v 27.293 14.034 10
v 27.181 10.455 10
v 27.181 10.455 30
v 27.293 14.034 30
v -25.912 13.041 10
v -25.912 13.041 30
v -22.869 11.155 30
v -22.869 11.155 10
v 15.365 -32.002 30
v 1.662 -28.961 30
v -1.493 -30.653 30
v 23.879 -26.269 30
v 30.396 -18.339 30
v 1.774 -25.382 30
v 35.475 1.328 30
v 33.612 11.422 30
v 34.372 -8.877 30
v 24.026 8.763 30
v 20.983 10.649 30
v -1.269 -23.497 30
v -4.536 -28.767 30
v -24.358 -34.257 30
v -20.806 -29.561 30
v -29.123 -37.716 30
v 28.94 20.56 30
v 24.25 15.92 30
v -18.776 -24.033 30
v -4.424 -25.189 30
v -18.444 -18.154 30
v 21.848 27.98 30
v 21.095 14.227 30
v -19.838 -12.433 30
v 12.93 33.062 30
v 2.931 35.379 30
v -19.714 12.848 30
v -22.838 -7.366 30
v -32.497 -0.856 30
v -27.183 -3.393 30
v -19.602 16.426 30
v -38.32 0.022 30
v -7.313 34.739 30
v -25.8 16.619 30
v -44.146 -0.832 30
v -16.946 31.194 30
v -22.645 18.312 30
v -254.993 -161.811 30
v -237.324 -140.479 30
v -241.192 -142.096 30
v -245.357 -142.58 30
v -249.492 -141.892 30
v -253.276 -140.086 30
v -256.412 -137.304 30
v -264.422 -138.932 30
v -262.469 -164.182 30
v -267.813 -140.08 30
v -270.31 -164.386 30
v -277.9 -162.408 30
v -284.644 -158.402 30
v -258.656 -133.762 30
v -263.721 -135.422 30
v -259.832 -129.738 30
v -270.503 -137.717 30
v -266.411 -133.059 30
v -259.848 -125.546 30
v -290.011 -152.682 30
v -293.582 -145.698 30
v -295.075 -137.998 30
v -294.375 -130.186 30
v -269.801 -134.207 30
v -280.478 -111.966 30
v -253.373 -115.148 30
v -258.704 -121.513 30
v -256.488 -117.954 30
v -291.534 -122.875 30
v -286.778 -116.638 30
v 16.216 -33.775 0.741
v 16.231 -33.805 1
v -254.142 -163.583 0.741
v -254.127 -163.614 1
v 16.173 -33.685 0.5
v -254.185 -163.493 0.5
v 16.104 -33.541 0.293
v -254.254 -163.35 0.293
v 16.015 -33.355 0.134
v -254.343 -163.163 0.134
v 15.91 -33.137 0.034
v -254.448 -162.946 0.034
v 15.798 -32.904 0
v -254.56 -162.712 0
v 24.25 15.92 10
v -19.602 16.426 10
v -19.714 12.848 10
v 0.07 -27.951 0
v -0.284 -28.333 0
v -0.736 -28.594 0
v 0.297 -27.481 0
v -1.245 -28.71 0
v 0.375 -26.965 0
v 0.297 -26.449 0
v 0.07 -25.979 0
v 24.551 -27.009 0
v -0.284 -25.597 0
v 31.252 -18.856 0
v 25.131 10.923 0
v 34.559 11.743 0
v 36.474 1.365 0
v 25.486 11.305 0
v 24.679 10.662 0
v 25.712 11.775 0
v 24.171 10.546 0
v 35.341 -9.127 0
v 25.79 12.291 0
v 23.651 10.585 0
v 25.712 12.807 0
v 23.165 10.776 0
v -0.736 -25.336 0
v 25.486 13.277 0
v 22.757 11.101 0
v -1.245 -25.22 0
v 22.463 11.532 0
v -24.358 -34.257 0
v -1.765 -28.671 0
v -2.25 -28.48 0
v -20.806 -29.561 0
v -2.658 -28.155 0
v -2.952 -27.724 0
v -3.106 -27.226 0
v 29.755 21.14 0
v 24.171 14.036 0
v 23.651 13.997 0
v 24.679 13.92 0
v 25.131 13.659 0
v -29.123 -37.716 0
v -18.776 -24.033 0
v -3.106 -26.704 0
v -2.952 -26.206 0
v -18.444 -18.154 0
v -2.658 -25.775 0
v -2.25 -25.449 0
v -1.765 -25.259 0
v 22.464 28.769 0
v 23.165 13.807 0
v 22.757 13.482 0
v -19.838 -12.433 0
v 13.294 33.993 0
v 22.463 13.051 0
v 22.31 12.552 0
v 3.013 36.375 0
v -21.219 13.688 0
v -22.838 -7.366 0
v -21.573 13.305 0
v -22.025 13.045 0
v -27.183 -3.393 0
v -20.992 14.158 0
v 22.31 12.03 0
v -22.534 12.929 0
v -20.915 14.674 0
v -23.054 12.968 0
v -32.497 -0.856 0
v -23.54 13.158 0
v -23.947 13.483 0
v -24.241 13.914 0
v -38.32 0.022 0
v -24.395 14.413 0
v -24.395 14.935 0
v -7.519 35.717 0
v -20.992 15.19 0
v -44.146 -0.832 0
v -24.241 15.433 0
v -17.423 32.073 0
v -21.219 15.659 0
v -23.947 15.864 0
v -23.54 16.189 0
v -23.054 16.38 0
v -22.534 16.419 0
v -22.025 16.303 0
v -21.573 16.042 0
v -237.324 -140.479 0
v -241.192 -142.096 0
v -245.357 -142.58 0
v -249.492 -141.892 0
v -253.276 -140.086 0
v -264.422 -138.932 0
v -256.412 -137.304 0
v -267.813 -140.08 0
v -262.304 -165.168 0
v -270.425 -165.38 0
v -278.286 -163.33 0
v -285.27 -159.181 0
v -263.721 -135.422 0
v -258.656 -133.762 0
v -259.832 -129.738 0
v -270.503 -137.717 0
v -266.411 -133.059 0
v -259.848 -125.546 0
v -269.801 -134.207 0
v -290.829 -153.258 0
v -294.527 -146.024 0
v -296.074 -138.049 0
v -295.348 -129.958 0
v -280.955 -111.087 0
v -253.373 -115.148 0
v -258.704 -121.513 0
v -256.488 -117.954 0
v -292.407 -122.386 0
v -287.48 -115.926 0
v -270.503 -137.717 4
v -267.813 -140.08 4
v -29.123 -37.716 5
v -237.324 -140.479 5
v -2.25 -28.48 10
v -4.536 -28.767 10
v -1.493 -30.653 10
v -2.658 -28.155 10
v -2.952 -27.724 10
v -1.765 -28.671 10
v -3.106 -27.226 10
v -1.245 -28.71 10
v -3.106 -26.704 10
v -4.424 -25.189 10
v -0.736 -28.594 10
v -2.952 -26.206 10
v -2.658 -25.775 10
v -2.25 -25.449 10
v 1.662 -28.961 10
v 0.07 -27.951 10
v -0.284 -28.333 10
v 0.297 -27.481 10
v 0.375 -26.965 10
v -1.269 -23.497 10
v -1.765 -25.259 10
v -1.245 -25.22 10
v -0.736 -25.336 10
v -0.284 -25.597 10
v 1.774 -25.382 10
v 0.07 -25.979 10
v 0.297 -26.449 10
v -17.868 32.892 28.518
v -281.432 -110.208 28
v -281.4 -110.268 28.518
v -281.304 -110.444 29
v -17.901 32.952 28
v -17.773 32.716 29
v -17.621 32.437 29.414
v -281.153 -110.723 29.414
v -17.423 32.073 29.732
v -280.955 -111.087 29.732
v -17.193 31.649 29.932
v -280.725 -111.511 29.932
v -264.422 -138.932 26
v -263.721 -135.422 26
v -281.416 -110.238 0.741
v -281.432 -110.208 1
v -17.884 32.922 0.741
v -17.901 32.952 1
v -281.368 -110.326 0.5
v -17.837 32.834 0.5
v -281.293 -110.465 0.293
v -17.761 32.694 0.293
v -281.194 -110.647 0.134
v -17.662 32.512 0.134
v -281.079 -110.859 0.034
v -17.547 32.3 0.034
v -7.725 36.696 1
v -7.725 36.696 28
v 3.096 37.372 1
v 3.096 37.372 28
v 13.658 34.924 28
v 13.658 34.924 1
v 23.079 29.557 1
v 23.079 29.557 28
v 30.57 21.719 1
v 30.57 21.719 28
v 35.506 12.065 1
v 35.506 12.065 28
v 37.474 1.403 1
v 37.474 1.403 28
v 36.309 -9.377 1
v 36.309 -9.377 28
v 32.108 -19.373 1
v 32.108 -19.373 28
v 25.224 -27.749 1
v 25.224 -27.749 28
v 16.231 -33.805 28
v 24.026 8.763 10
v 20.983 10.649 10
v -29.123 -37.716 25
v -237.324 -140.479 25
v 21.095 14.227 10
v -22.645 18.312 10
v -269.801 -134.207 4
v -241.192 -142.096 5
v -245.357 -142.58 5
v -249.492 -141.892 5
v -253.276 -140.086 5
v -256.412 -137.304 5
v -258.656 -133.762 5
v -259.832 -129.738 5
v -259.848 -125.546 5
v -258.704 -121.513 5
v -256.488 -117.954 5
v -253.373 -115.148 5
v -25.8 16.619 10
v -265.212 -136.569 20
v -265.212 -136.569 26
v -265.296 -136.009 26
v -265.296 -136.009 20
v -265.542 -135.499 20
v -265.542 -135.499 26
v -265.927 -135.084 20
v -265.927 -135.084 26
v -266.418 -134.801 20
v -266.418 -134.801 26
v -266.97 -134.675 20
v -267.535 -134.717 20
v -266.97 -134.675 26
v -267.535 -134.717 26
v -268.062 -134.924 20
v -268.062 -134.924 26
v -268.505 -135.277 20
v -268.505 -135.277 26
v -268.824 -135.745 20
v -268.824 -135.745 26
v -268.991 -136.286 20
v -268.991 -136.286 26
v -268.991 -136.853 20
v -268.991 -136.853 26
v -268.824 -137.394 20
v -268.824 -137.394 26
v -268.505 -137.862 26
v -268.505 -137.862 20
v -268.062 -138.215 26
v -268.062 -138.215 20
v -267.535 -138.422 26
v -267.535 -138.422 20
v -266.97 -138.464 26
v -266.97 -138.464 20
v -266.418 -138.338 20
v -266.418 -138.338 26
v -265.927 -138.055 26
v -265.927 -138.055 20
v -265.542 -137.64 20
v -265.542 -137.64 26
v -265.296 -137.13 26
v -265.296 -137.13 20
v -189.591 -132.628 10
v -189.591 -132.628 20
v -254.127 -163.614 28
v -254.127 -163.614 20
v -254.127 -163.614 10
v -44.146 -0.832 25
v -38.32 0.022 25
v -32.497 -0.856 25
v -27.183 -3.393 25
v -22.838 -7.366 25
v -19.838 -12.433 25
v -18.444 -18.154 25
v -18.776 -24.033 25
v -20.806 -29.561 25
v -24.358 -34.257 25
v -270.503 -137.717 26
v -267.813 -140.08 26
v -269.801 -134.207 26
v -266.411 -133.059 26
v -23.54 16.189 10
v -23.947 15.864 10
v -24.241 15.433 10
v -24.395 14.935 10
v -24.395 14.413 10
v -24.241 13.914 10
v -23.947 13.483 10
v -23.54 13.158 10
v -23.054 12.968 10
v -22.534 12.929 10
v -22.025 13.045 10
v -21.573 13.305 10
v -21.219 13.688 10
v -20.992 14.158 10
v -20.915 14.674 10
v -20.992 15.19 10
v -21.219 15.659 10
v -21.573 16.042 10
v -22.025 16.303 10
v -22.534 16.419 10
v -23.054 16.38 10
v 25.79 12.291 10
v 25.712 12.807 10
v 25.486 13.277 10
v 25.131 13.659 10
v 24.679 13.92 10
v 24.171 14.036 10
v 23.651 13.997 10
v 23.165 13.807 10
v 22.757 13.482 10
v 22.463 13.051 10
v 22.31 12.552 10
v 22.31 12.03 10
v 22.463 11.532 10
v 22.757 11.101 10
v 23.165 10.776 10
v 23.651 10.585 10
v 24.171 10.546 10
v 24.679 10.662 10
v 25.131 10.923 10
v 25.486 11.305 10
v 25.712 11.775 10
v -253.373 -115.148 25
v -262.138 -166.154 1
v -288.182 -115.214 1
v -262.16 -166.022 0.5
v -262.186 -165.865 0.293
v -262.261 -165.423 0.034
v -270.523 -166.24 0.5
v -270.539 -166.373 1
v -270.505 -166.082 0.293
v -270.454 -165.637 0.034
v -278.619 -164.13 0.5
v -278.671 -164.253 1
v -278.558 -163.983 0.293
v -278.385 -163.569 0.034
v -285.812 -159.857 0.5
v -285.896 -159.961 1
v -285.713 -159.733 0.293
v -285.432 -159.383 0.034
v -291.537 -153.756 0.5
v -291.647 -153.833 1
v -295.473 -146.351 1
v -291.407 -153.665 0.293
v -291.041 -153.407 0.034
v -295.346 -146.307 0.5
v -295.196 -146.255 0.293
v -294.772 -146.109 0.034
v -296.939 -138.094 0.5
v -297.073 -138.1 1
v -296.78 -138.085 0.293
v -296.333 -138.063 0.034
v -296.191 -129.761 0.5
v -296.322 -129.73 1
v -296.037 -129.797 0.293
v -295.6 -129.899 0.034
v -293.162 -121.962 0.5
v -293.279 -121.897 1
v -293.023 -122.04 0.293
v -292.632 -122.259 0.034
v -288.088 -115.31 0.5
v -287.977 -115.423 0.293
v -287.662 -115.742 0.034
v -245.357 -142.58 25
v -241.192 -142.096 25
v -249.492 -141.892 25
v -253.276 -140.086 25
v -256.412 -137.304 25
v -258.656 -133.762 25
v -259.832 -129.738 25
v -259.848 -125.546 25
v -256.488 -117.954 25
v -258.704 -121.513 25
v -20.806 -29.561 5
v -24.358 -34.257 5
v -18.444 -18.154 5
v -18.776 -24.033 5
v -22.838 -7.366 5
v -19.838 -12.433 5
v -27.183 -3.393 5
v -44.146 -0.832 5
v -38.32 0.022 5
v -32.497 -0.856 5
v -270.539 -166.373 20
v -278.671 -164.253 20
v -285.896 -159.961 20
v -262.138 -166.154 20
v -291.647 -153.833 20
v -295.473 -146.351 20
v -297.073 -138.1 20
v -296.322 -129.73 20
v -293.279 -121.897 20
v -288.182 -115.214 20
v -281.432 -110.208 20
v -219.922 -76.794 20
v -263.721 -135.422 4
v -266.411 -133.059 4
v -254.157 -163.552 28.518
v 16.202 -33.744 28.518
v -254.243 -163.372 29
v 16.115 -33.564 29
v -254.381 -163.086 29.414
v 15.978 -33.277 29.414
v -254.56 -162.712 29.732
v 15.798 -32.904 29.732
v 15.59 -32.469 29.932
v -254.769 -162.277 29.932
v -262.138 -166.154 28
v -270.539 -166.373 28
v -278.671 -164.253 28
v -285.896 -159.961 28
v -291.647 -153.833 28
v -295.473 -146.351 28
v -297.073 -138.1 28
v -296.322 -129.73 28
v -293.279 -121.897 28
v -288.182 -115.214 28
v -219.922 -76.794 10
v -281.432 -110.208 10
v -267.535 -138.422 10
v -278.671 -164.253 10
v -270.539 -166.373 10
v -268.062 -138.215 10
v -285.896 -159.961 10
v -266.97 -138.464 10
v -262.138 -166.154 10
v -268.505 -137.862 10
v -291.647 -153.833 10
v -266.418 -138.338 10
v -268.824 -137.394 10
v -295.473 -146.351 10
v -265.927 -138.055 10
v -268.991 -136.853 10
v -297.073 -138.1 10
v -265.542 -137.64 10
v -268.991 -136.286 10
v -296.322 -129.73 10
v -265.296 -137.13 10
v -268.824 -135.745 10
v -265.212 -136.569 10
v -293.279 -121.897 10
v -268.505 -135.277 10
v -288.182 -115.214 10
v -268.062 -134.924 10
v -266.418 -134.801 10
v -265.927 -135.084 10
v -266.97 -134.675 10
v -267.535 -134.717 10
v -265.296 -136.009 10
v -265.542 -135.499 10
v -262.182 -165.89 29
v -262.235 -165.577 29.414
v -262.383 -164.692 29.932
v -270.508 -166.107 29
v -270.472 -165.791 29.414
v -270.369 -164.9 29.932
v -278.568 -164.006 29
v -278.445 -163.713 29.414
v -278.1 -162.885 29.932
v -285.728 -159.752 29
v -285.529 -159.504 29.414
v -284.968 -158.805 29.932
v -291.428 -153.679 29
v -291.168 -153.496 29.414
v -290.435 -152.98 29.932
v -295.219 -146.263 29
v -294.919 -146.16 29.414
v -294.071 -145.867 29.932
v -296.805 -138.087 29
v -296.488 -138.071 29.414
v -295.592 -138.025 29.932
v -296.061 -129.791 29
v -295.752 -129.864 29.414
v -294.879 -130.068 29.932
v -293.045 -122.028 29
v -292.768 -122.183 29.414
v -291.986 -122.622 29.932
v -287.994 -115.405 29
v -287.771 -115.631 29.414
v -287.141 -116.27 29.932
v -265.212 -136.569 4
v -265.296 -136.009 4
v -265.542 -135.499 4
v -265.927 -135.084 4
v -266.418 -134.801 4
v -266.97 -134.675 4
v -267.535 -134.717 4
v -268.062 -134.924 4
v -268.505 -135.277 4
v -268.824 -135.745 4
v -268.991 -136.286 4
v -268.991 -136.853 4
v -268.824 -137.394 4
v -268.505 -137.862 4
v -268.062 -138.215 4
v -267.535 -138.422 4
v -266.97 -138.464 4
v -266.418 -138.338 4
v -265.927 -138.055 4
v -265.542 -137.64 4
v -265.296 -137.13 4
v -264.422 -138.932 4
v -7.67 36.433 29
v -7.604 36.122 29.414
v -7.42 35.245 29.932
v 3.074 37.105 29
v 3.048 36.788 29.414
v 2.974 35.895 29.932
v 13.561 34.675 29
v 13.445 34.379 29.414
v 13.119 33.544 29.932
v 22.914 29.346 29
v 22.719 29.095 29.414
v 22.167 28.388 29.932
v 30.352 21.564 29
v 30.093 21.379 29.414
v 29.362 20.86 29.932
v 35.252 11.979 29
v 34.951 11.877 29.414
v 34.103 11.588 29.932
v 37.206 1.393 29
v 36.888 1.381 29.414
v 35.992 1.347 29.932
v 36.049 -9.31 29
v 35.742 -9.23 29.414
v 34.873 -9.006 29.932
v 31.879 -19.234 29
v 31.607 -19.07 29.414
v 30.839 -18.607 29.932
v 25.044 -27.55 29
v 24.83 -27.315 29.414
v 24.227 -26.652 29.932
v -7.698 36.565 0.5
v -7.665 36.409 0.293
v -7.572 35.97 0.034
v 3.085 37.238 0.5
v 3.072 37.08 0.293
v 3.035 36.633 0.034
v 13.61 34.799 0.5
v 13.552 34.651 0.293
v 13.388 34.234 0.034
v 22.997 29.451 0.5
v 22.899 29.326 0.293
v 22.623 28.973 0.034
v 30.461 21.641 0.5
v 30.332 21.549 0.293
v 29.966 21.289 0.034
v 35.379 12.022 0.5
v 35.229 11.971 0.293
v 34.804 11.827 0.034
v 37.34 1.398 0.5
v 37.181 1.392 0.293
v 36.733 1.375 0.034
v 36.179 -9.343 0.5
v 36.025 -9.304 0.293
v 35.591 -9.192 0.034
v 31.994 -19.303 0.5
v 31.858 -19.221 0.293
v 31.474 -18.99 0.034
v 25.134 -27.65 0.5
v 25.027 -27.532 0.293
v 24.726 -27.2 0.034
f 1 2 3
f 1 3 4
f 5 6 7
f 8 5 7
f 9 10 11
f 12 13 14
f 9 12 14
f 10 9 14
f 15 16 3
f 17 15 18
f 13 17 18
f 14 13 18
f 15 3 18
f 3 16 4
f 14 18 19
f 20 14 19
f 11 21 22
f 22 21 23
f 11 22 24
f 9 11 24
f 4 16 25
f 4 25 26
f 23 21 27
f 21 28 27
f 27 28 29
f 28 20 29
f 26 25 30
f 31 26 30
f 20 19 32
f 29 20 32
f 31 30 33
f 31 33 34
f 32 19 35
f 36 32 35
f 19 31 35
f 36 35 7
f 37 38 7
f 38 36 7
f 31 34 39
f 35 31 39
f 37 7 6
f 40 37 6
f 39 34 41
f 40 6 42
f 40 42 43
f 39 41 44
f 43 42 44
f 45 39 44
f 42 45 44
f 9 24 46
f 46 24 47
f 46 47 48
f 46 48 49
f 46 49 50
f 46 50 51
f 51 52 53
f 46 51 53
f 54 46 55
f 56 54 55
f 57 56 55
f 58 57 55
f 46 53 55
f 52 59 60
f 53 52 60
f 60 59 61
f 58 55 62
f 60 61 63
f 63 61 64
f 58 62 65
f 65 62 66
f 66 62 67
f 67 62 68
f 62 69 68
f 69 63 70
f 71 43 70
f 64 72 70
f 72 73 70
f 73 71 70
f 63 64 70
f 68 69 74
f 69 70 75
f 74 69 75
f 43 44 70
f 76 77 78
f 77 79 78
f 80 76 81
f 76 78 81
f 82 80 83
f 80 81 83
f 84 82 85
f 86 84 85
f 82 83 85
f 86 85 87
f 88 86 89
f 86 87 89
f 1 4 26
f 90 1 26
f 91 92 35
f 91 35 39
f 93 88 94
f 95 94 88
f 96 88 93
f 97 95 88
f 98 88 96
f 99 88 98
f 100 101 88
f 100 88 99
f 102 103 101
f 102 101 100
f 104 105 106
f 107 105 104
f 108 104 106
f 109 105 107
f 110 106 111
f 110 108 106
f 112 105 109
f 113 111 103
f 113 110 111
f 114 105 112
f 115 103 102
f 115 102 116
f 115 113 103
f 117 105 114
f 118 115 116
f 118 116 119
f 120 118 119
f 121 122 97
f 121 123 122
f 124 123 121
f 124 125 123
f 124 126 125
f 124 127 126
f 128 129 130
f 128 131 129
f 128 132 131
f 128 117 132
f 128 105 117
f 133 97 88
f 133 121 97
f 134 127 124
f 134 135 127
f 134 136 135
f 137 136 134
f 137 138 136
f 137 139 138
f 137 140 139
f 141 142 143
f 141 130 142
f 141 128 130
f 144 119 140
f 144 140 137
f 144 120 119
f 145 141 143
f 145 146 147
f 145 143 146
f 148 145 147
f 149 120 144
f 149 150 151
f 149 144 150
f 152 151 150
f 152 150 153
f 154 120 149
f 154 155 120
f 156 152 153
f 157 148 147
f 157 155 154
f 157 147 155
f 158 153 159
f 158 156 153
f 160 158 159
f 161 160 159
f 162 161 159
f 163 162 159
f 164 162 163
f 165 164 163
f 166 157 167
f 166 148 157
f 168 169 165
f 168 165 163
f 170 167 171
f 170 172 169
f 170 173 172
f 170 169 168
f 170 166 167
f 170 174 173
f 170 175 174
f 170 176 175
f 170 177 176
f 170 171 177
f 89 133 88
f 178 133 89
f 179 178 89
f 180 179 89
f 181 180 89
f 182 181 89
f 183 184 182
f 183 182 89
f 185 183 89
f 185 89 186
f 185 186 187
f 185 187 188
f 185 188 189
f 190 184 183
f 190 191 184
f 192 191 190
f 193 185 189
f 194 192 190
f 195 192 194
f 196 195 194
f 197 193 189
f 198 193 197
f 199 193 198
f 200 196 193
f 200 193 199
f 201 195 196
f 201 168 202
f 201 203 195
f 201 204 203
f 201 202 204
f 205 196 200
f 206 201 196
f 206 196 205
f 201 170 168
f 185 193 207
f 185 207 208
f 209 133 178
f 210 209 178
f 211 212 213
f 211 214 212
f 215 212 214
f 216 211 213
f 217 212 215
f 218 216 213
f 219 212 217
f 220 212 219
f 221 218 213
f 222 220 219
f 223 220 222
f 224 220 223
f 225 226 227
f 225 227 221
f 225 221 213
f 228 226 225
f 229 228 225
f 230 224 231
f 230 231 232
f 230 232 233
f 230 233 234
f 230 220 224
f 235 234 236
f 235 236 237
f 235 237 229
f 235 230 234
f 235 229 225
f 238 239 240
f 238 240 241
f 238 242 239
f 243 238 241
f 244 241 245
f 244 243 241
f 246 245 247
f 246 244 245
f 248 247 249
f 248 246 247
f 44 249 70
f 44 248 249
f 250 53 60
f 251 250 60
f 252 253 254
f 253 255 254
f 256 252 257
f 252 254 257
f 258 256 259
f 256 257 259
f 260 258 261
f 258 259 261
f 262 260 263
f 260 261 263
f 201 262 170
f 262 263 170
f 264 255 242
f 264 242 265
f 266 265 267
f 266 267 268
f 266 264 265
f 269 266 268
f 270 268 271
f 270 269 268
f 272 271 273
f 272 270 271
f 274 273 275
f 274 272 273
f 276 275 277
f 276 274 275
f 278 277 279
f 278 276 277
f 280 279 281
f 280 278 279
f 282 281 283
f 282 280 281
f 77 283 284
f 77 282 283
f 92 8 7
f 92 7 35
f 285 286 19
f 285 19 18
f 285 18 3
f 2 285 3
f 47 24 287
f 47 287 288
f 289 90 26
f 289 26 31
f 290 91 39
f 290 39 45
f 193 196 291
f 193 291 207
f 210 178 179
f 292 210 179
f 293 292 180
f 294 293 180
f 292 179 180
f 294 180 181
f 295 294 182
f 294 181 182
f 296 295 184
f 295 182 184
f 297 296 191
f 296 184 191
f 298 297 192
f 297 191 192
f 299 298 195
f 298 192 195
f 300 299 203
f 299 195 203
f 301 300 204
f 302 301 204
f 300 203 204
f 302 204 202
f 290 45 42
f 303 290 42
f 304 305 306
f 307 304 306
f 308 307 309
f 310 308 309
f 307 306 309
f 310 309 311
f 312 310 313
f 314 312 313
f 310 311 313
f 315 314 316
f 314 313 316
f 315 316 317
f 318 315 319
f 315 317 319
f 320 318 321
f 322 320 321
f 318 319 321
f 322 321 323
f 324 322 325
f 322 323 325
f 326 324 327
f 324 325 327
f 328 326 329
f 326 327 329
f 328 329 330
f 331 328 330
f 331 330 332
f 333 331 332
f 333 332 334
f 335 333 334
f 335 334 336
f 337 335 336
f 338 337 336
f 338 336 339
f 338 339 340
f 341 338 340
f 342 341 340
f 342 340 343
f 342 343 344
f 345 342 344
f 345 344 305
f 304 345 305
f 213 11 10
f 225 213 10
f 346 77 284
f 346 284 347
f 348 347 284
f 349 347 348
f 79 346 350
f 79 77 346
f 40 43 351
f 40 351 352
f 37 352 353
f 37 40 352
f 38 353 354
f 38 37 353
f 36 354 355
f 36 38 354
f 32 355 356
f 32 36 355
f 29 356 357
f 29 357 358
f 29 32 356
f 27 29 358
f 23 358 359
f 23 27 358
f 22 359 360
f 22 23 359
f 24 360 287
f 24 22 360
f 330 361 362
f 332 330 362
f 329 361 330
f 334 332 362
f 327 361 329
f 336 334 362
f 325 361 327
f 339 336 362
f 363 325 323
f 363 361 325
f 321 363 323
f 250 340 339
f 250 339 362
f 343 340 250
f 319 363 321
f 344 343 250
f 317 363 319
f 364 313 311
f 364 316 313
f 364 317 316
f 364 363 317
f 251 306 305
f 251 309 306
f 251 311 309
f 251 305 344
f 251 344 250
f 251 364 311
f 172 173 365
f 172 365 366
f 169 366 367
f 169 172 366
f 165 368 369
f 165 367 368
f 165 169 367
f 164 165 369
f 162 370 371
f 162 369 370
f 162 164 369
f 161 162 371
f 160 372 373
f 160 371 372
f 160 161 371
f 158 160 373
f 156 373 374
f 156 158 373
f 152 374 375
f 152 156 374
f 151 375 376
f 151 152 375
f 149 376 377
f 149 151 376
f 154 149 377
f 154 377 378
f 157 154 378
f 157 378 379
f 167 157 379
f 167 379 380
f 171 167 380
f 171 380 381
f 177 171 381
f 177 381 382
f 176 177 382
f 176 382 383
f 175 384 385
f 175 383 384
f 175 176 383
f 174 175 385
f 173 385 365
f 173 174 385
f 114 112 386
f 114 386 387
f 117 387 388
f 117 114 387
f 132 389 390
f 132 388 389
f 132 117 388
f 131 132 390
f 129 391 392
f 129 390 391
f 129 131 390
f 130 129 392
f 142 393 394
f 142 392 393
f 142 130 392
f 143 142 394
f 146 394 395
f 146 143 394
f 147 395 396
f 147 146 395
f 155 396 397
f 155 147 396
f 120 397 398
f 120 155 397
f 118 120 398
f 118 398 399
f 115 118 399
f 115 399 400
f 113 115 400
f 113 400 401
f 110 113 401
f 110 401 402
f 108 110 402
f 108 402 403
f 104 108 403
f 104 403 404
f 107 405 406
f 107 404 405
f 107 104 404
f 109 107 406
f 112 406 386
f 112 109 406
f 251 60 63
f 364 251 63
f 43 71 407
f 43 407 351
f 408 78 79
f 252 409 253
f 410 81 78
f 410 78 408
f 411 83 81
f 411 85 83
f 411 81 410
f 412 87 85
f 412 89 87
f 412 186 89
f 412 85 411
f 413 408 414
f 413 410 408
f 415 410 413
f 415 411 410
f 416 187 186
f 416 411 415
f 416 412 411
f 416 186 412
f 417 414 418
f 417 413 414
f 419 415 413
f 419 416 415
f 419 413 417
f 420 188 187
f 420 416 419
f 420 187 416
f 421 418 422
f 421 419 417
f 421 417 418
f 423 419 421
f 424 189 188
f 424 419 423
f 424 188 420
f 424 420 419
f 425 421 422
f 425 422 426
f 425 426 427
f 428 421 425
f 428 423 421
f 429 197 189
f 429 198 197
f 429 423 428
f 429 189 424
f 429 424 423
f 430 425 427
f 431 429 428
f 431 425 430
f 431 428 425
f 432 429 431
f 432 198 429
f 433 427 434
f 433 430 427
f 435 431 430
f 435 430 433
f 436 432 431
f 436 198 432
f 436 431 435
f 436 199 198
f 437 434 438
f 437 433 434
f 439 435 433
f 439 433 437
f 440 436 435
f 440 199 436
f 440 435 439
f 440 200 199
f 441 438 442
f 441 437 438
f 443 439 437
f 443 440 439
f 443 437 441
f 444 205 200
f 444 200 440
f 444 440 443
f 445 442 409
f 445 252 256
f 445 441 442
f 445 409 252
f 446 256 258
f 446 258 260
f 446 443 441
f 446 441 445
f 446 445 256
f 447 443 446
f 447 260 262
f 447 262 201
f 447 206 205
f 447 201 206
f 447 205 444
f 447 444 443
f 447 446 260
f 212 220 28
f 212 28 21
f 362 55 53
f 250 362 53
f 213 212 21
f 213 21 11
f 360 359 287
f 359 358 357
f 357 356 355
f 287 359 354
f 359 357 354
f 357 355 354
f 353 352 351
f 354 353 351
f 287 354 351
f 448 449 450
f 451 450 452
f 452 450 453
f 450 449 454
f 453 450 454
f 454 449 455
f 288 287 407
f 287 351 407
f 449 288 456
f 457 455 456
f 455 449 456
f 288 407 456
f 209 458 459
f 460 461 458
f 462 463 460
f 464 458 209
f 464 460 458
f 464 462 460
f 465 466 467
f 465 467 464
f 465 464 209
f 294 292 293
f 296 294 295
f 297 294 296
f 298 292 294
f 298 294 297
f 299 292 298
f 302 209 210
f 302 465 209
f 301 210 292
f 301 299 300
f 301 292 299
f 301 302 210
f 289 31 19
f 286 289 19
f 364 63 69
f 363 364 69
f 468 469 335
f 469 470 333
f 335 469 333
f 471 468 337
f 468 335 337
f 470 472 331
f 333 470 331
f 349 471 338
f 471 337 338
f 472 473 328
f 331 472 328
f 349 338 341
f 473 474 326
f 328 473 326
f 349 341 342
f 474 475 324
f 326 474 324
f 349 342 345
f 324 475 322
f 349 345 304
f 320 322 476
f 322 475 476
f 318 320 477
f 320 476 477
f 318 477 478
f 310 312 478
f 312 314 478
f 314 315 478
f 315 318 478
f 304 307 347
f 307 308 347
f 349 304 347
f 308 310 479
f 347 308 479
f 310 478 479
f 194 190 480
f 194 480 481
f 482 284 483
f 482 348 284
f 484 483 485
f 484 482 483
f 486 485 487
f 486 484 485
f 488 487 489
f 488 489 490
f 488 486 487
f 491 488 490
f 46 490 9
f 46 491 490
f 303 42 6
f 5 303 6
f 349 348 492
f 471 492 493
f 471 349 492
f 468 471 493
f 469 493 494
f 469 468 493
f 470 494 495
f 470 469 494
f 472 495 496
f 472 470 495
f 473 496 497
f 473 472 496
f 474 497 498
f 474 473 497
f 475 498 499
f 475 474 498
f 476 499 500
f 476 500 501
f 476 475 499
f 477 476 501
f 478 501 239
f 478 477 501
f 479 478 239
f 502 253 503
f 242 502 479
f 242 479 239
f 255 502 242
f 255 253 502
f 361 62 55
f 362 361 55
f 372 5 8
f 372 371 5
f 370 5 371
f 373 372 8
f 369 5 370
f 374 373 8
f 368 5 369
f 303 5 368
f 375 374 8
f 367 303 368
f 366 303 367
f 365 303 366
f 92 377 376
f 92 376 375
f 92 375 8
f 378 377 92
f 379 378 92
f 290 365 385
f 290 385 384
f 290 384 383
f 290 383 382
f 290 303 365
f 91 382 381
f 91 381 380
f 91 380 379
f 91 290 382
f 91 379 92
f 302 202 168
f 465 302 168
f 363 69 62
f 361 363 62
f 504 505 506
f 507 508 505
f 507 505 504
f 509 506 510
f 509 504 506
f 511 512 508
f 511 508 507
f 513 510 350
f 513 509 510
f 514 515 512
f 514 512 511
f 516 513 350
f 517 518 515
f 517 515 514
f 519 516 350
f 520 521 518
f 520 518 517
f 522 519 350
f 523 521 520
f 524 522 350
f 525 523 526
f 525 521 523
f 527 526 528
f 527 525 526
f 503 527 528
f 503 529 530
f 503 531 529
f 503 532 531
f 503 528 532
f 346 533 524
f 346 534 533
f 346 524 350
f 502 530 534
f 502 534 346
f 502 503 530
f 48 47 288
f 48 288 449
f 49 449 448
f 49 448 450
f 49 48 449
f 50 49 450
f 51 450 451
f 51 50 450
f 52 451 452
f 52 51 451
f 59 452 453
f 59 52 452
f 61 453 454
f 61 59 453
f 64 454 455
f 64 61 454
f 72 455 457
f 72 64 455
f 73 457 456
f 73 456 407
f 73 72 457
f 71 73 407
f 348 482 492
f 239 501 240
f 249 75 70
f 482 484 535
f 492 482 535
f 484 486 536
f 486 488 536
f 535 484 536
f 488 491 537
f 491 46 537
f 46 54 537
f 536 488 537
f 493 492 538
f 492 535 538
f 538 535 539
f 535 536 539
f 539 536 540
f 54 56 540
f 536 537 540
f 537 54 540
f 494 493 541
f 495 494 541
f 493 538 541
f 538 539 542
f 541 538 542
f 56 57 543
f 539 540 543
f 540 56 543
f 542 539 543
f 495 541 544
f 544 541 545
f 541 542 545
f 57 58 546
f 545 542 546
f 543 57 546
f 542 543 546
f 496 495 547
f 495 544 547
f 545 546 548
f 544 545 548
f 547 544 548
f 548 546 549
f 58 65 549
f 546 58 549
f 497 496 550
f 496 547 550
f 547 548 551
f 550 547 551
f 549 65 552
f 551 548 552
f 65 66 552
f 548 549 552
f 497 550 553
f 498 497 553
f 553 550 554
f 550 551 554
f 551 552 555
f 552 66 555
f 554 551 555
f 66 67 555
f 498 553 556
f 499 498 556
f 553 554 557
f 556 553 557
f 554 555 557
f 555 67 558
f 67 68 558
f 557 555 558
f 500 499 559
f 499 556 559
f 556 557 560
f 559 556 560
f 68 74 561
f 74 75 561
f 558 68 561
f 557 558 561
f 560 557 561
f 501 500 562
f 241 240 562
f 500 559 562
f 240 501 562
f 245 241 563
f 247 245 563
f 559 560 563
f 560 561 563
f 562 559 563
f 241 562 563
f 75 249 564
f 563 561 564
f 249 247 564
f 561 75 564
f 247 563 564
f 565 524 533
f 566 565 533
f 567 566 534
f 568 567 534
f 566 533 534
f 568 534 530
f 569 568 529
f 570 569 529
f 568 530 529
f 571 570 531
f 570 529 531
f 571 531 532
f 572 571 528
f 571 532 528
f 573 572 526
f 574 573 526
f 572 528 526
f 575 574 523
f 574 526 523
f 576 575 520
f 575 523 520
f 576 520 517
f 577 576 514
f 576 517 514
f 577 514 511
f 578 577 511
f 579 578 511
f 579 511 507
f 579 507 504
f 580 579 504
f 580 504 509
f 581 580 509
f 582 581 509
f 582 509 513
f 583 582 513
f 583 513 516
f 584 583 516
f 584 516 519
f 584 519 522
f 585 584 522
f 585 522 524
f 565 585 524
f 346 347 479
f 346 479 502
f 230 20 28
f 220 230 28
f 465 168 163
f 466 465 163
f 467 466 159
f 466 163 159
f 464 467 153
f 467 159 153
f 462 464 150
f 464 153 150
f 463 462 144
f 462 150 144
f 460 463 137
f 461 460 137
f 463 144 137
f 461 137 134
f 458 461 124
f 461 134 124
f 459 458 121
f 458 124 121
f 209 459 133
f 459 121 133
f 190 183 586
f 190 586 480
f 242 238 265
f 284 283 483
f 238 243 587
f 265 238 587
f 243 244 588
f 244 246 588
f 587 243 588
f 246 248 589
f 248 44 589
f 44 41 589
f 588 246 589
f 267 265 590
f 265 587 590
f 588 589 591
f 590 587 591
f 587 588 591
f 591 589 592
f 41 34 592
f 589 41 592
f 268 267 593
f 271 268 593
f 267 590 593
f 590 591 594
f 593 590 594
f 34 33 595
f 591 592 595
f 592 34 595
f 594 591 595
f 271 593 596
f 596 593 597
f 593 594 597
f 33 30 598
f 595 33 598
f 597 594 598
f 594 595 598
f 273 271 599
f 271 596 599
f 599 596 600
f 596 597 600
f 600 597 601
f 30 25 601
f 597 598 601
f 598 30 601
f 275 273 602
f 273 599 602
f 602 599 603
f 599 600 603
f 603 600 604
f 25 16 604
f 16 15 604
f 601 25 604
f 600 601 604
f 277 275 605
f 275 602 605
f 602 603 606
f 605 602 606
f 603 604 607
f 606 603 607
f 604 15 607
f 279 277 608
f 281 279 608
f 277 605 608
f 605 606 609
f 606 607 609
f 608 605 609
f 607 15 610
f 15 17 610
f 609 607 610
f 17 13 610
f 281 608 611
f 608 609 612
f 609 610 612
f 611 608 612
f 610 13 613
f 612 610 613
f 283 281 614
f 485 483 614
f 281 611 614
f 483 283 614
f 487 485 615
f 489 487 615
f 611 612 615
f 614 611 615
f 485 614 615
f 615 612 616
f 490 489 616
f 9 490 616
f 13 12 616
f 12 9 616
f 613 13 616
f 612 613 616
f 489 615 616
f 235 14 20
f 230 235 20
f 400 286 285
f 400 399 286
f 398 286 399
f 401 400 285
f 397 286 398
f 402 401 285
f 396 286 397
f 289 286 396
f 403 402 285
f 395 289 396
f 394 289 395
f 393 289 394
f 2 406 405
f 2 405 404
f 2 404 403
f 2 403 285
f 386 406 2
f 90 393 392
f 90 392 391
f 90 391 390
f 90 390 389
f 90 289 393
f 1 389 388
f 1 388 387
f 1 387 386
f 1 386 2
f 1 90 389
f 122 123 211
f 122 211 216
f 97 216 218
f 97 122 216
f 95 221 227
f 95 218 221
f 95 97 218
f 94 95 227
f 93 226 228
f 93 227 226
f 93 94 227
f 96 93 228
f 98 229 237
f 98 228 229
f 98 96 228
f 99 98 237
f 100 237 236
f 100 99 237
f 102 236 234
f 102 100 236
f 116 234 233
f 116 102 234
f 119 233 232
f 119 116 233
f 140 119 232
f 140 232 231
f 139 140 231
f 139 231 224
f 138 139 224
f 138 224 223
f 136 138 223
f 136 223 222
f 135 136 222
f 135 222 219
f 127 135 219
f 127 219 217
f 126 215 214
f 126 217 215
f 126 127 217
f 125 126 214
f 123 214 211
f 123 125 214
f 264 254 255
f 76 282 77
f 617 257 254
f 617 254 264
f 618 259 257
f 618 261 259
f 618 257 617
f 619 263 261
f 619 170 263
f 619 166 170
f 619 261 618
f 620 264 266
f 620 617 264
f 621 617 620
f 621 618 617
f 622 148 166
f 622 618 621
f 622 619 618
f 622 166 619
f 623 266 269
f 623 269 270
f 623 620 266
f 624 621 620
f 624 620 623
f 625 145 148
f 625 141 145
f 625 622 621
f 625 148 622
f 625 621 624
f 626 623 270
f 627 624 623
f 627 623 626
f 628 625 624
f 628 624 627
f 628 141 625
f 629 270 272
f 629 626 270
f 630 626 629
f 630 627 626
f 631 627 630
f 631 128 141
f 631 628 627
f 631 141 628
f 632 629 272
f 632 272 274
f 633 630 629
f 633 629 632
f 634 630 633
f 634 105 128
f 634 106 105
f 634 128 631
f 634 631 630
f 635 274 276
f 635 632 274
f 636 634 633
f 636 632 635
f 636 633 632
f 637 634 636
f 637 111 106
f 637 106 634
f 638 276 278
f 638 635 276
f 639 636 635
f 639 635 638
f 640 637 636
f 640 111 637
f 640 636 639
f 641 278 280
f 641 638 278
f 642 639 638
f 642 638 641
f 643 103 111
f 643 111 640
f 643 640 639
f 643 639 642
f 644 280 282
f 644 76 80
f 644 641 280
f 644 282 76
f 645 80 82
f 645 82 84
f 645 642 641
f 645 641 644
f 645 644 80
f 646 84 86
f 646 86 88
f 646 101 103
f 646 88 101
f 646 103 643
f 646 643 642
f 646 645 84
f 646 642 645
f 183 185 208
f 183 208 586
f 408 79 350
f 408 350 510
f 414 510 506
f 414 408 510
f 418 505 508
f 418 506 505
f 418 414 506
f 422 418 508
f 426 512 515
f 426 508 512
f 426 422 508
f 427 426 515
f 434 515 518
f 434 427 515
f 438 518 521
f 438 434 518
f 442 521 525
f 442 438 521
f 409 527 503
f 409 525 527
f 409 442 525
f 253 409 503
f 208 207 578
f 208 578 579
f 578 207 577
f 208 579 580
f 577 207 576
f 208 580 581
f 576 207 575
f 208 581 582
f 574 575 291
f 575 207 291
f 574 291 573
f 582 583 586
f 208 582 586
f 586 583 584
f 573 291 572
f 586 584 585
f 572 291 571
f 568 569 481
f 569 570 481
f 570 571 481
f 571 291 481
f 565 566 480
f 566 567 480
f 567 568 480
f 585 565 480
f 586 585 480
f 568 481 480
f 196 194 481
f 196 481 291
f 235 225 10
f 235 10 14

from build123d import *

# Parameters (mm, degrees)
BOSS_EXTRUDE1_DEPTH = 30
FILLET1_R           = 2
FILLET2_R           = 1
SKETCH6_W           = 100
SKETCH6_H           = 10
CUT_EXTRUDE3_DEPTH  = 129
CUT_EXTRUDE4_DEPTH  = 4
SKETCH8_R           = 1.9
CUT_EXTRUDE6_DEPTH  = 112
CUT_EXTRUDE7_DEPTH  = 5
CUT_EXTRUDE8_DEPTH  = 20
CUT_EXTRUDE9_START  = -70
SKETCH10_R          = 1.75
CUT_EXTRUDE9_DEPTH  = 71
CIRPATTERN1_COUNT   = 3


with BuildPart() as part:
    # Sketch1 → Boss-Extrude1 (new body)
    with BuildSketch(Plane.XY):
        with BuildLine():
            Line((-281.432373232, -110.20807274), (-17.900575614, 32.951773741))
            ThreePointArc((-17.900575614, 32.951773741), (33.388989093, 17.071186467), (16.23112616, -33.805333064))
            Line((16.23112616, -33.805333064), (-254.127011813, -163.613758184))
            ThreePointArc((-254.127011813, -163.613758184), (-293.823104015, -150.226440906), (-281.432373232, -110.20807274))
        make_face()
    extrude(amount=BOSS_EXTRUDE1_DEPTH)

    # Fillet1
    fillet1_edges = [part.edges().sort_by_distance(p)[0] for p in [
        (33.388989093, 17.071186467, 30),
        (-149.666474423, -38.628149499, 30),
        (-293.823104015, -150.226440906, 30),
        (-118.947942827, -98.709545624, 30),
    ]]
    fillet(fillet1_edges, radius=FILLET1_R)

    # Fillet2
    fillet2_edges = [part.edges().sort_by_distance(p)[0] for p in [
        (-149.666474423, -38.628149499, 0),
        (33.388989093, 17.071186467, 0),
        (-118.947942827, -98.709545624, 0),
        (-293.823104015, -150.226440906, 0),
    ]]
    fillet(fillet2_edges, radius=FILLET2_R)

    # Sketch6 → Cut-Extrude3 (cut)
    with BuildSketch(Plane(origin=(-17.900575614, 32.951773741, 0), x_dir=(0.8787139664263899, 0.4773486830475195, 0), z_dir=(-0.47734868304751954, 0.87871396642639, 0))):
        with Locations((-279.906235347, -15)):
            Rectangle(SKETCH6_W, SKETCH6_H)
    extrude(amount=-CUT_EXTRUDE3_DEPTH, mode=Mode.SUBTRACT)

    # Sketch7 → Cut-Extrude4 (cut)
    with BuildSketch(Plane.XY.offset(30)):
        Polygon((-263.720924854, -135.421623642), (-266.410501723, -133.058876034), (-269.80148961, -134.206744124), (-270.502900627, -137.717359822), (-267.813323758, -140.080107431), (-264.422335871, -138.932239341), align=None)
    cut_extrude4 = extrude(amount=-CUT_EXTRUDE4_DEPTH, mode=Mode.SUBTRACT)

    # Sketch8 → Cut-Extrude6 (cut)
    with BuildSketch(Plane.XY.offset(26)):
        with Locations((-267.111912741, -136.569491732)):
            Circle(SKETCH8_R)
    extrude(amount=-CUT_EXTRUDE6_DEPTH, mode=Mode.SUBTRACT)

    # Mirror1: Cut-Extrude4 across plane
    add(cut_extrude4.mirror(Plane.XY.offset(15)), mode=Mode.SUBTRACT)

    # Sketch9 → Cut-Extrude7 (cut)
    with BuildSketch(Plane.XY.offset(30)):
        with BuildLine():
            Line((-253.373411521, -115.147546234), (-44.145606003, -0.832397564))
            ThreePointArc((-44.145606003, -0.832397564), (-19.838333174, -12.433391688), (-29.122969005, -37.716233984))
            Line((-29.122969005, -37.716233984), (-237.324421153, -140.479268617))
            ThreePointArc((-237.324421153, -140.479268617), (-257.658147226, -135.611958389), (-253.373411521, -115.147546234))
        make_face()
    cut_extrude7 = extrude(amount=-CUT_EXTRUDE7_DEPTH, mode=Mode.SUBTRACT)

    # Mirror2: Cut-Extrude7 across plane
    add(cut_extrude7.mirror(Plane.XY.offset(15)), mode=Mode.SUBTRACT)

    # Sketch3 → Cut-Extrude8 (cut)
    with BuildSketch(Plane.XY.offset(30)):
        Polygon((-4.424109202, -25.18892785), (-4.53581637, -28.767184619), (-1.492808691, -30.65305425), (1.661906157, -28.96066711), (1.773613325, -25.382410341), (-1.269394354, -23.496540711), align=None)
        Polygon((27.292728029, 14.033716876), (24.249720349, 15.919586506), (21.095005502, 14.227199366), (20.983298334, 10.648942597), (24.026306013, 8.763072967), (27.181020861, 10.455460106), align=None)
        Polygon((-19.602196811, 16.425854883), (-22.645204491, 18.311724513), (-25.799919338, 16.619337374), (-25.911626506, 13.041080604), (-22.868618827, 11.155210974), (-19.713903979, 12.847598114), align=None)
    extrude(amount=-CUT_EXTRUDE8_DEPTH, mode=Mode.SUBTRACT)

    # Sketch10 → Cut-Extrude9 (cut)
    with BuildSketch(Plane.XY.offset(10).offset(CUT_EXTRUDE9_START)):
        with Locations((24.040072147, 12.291254256)):
            Circle(SKETCH10_R)
    cut_extrude9 = extrude(amount=CUT_EXTRUDE9_DEPTH, mode=Mode.SUBTRACT)

    # CirPattern1: Cut-Extrude9 ×3 about axis
    cirpattern1_axis = Axis((0, 0, 0), (0, 0, 1))
    for i in range(1, CIRPATTERN1_COUNT):
        add(cut_extrude9.rotate(cirpattern1_axis, i * 360 / CIRPATTERN1_COUNT), mode=Mode.SUBTRACT)


solid = part.part
